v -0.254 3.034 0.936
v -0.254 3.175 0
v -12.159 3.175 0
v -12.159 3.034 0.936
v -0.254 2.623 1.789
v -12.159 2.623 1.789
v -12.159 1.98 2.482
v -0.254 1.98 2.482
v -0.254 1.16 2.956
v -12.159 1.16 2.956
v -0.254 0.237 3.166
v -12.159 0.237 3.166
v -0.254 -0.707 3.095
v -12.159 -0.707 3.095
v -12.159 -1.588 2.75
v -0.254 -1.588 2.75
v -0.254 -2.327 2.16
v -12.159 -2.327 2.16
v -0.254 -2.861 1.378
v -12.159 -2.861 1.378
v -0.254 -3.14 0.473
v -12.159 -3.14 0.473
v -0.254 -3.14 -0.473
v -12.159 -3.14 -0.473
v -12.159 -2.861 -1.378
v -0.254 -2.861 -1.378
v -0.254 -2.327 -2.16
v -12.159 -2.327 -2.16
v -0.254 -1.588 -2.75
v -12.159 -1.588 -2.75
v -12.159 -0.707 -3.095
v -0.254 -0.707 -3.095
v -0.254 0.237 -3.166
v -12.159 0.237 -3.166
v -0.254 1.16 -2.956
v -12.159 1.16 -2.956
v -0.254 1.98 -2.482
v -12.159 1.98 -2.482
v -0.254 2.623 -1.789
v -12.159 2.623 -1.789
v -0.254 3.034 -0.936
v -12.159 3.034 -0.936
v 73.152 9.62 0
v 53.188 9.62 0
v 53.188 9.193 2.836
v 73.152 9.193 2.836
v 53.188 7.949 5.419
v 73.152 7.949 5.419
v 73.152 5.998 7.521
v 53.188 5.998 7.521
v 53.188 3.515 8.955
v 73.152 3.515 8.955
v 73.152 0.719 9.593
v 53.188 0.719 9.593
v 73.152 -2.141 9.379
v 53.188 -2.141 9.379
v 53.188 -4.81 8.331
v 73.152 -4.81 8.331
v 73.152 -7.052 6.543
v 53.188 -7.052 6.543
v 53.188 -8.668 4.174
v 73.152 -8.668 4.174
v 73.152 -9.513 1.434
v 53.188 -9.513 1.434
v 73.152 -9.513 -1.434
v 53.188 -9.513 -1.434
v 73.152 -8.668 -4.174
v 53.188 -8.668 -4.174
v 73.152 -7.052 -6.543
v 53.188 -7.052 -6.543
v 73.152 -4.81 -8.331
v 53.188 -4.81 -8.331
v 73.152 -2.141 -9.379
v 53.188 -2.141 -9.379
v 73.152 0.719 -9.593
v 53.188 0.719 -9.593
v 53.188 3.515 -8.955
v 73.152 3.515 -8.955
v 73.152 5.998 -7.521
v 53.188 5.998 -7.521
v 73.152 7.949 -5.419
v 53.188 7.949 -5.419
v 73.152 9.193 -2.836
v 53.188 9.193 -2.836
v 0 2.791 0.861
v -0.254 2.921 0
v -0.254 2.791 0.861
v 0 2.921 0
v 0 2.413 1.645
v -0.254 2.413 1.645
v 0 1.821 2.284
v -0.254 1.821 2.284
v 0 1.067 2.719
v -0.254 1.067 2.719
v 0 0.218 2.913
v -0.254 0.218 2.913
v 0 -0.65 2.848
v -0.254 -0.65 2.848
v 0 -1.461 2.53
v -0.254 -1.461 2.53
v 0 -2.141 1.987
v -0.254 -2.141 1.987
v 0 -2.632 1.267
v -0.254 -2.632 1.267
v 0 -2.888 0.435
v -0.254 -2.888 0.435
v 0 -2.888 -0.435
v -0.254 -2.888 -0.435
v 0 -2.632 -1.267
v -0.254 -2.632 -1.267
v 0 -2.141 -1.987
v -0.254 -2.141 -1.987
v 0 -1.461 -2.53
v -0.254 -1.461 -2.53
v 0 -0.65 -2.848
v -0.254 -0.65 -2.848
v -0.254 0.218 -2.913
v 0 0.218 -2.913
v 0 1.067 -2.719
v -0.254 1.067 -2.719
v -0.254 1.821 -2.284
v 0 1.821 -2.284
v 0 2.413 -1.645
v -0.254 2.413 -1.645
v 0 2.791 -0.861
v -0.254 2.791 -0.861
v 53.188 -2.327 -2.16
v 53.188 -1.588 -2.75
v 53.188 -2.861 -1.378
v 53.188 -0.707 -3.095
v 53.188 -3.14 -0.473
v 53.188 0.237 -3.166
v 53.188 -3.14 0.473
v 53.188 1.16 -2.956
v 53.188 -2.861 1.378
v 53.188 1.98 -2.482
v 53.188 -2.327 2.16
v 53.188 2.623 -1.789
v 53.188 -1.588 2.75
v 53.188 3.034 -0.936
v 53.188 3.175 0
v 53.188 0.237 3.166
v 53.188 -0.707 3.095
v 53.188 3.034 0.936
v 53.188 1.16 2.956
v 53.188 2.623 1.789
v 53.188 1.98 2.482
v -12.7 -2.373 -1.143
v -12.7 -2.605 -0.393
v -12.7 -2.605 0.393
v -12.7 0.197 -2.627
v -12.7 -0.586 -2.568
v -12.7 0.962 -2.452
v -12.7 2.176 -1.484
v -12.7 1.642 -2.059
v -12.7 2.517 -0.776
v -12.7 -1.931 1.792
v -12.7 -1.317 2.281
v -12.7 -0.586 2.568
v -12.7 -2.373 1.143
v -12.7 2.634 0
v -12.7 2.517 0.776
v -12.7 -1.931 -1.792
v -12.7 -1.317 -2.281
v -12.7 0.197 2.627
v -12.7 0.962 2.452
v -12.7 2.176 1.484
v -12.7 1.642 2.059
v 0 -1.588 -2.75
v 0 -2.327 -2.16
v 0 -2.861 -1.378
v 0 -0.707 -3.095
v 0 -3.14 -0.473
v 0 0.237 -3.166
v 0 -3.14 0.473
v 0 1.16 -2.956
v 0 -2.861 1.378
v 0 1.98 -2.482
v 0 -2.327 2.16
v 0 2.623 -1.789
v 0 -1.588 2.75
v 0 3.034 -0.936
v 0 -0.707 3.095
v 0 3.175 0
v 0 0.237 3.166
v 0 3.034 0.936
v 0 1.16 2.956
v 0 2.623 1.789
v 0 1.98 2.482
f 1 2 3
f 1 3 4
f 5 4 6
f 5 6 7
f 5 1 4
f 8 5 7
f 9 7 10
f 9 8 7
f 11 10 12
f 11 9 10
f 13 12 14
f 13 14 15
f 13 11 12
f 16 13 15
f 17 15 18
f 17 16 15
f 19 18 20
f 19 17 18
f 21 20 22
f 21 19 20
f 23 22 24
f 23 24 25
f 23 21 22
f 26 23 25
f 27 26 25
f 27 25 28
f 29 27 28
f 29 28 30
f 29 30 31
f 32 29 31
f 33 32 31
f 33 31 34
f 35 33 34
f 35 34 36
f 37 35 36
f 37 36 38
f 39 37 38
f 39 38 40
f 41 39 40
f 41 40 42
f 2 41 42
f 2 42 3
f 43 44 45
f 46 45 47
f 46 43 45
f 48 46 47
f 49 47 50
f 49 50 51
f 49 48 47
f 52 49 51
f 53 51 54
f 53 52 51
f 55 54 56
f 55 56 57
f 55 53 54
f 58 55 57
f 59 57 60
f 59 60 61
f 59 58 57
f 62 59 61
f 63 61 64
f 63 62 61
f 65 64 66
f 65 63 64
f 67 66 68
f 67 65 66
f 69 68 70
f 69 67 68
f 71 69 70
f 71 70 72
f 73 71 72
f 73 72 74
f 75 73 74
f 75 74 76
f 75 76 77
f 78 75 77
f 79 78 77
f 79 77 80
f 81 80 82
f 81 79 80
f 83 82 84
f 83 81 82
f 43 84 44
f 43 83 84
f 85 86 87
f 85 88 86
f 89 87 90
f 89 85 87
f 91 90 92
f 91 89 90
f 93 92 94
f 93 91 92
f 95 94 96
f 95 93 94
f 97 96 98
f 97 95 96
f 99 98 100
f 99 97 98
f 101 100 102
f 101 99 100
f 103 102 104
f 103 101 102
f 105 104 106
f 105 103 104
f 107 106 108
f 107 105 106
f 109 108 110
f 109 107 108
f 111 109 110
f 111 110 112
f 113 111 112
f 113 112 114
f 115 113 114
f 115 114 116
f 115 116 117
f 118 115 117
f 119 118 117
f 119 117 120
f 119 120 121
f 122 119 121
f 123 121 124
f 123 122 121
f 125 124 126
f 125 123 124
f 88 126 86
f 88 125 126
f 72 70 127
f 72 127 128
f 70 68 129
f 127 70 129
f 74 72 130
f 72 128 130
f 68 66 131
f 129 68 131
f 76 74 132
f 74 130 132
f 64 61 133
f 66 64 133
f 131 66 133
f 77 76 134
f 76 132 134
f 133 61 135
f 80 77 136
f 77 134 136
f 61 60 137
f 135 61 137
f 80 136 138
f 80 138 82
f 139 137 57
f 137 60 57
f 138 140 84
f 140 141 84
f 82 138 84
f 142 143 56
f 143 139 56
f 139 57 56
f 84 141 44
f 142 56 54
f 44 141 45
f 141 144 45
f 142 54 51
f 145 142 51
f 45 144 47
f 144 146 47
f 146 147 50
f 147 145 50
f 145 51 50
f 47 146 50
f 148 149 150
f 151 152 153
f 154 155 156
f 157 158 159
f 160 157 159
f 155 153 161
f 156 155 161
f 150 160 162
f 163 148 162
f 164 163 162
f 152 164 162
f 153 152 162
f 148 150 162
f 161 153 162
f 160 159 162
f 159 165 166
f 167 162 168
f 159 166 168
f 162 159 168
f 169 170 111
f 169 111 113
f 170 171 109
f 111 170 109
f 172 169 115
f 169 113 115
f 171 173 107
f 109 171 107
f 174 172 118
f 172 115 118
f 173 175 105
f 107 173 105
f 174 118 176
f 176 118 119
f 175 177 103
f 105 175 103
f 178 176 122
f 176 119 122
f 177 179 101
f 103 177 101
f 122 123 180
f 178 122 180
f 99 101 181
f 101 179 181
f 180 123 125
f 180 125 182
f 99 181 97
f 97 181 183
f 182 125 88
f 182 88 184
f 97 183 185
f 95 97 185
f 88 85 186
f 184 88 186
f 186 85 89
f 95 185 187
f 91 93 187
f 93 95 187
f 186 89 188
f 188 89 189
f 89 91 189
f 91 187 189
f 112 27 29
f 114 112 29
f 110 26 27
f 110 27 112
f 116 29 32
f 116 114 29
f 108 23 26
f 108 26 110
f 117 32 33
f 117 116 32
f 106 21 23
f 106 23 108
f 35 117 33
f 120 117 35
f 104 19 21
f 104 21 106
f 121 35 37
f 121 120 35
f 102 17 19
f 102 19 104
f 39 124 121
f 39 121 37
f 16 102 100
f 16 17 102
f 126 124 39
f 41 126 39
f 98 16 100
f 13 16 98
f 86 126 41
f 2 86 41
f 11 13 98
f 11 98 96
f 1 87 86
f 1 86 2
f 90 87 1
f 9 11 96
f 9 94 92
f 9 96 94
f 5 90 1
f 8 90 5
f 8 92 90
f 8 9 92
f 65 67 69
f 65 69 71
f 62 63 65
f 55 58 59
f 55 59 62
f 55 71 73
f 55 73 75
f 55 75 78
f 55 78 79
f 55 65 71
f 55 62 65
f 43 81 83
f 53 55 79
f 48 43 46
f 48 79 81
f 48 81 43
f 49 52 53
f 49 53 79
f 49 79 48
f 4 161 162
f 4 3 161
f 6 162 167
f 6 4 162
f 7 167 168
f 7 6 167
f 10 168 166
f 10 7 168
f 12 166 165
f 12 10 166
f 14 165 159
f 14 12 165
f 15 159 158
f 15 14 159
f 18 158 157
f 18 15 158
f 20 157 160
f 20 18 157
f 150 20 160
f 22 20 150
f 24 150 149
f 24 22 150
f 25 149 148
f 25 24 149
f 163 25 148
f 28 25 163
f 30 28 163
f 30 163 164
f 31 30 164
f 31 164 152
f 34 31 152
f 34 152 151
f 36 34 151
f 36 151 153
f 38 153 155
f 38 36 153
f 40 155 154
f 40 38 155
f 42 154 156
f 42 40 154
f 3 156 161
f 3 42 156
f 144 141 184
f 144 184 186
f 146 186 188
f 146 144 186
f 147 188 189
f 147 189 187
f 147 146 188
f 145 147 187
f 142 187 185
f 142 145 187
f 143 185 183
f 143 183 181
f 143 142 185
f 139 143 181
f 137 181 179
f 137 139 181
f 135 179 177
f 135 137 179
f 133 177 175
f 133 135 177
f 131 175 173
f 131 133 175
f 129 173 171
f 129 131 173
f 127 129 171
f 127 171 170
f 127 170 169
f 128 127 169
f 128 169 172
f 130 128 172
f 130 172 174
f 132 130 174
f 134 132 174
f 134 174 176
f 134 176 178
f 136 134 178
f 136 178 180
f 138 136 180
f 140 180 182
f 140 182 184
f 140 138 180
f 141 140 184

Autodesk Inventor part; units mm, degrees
sketch "Sketch_1" plane through (0, 0, 0) normal (0, 0, 1) x (1, 0, 0)
  line L0 (73.152, 0) -> (0, 0)
  line L1 (0, 0) -> (0, 3.175)
  line L2 (0, 3.175) -> (53.1876, 3.175)
  line L3 (53.1876, 3.175) -> (53.1876, 9.6203)
  line L4 (53.1876, 9.6203) -> (73.152, 9.6203)
  line L5 (73.152, 9.6203) -> (73.152, 0)
  line L6 (73.152, 0) -> (0, 0)
revolve "Revolution1" add sketch "Sketch_1" angle 360 about axis through (73.152, 0, 0) along (1, 0, 0)
sketch "Sketch_3" plane through (0, 0, 0) normal (0, 0, 1) x (1, 0, 0)
  line L0 (0, 0) -> (-12.7, 0)
  line L1 (-12.7, 0) -> (-12.7, 2.634)
  line L2 (-12.7, 2.634) -> (-12.159, 3.175)
  line L3 (-12.159, 3.175) -> (0, 3.175)
  line L4 (0, 3.175) -> (0, 0)
  line L5 (0, 0) -> (-12.7, 0)
revolve "Revolution2" add sketch "Sketch_3" angle 360 about axis through (0, 0, 0) along (1, 0, 0)
thread "Thread1" size "1/4-28 UNF" class "2A" standard "ANSI Unified Screw Threads" length 12.159
sketch "Sketch_30" plane through (0, 0, 0) normal (0, 0, 1) x (1, 0, 0)
  line L0 (0, 0) -> (-0.254, 0)
  line L1 (-0.254, 2.921) -> (0, 2.921)
  line L2 (0, 2.921) -> (0, 3.429)
  line L3 (0, 3.429) -> (-0.254, 3.429)
  line L4 (-0.254, 3.429) -> (-0.254, 2.921)
revolve "Revolution3" cut sketch "Sketch_30" angle 360 about axis through (0, 0, 0) along (1, 0, 0)
ref_plane "dia1_XY" through (0, 3.175, 0) normal (1, 0, 0) x (0, 0, -1)
ref_plane "dia1_YZ" through (0, 3.175, 0) normal (0, 0, -1) x (0, 1, 0)
ref_plane "dia1_ZX" through (0, 3.175, 0) normal (0, 1, 0) x (1, 0, 0)
ref_plane "dia12_XY" through (0, 0, 10.9537) normal (1, 0, 0) x (0, 0, -1)
ref_plane "dia12_YZ" through (0, 0, 10.9537) normal (0, 0, -1) x (0, 1, 0)
ref_plane "dia12_ZX" through (0, 0, 10.9537) normal (0, 1, 0) x (1, 0, 0)
ref_plane "dia1r_XY" through (0, 0, 10.2235) normal (1, 0, 0) x (0, 0, -1)
ref_plane "dia1r_YZ" through (0, 0, 10.2235) normal (0, 0, -1) x (0, 1, 0)
ref_plane "dia1r_ZX" through (0, 0, 10.2235) normal (0, 1, 0) x (1, 0, 0)
ref_plane "dia2_XY" through (0, -3.175, 0) normal (1, 0, 0) x (0, 0, -1)
ref_plane "dia2_YZ" through (0, -3.175, 0) normal (0, 0, -1) x (0, 1, 0)
ref_plane "dia2_ZX" through (0, -3.175, 0) normal (0, 1, 0) x (1, 0, 0)
ref_plane "dia22_XY" through (0, 0, -10.9537) normal (1, 0, 0) x (0, 0, -1)
ref_plane "dia22_YZ" through (0, 0, -10.9537) normal (0, 0, -1) x (0, 1, 0)
ref_plane "dia22_ZX" through (0, 0, -10.9537) normal (0, 1, 0) x (1, 0, 0)
ref_plane "dia2r_XY" through (0, 0, -10.2235) normal (1, 0, 0) x (0, 0, -1)
ref_plane "dia2r_YZ" through (0, 0, -10.2235) normal (0, 0, -1) x (0, 1, 0)
ref_plane "dia2r_ZX" through (0, 0, -10.2235) normal (0, 1, 0) x (1, 0, 0)
ref_plane "rl1_XY" through (-12.7, 0, 0) normal (1, 0, 0) x (0, 0, -1)
ref_plane "rl1_YZ" through (-12.7, 0, 0) normal (0, 0, -1) x (0, 1, 0)
ref_plane "rl1_ZX" through (-12.7, 0, 0) normal (0, 1, 0) x (1, 0, 0)
ref_plane "rl2_XY" through (0, 0, 0) normal (1, 0, 0) x (0, 0, -1)
ref_plane "rl2_YZ" through (0, 0, 0) normal (0, 0, -1) x (0, 1, 0)
ref_plane "rl2_ZX" through (0, 0, 0) normal (0, 1, 0) x (1, 0, 0)
ref_plane "rod_cp_XY" through (0, 0, 0) normal (1, 0, 0) x (0, 0, -1)
ref_plane "rod_cp_YZ" through (0, 0, 0) normal (0, 0, -1) x (0, 1, 0)
ref_plane "rod_cp_ZX" through (0, 0, 0) normal (0, 1, 0) x (1, 0, 0)
ref_plane "stroke1_XY" through (0, 0, 0) normal (1, 0, 0) x (0, 0, -1)
ref_plane "stroke1_YZ" through (0, 0, 0) normal (0, 0, -1) x (0, 1, 0)
ref_plane "stroke1_ZX" through (0, 0, 0) normal (0, 1, 0) x (1, 0, 0)
ref_plane "thd1_XY" through (-12.7, 3.175, 0) normal (1, 0, 0) x (0, 0, -1)
ref_plane "thd1_YZ" through (-12.7, 3.175, 0) normal (0, 0, -1) x (0, 1, 0)
ref_plane "thd1_ZX" through (-12.7, 3.175, 0) normal (0, 1, 0) x (1, 0, 0)
ref_plane "thd2_XY" through (-12.7, -3.175, 0) normal (1, 0, 0) x (0, 0, -1)
ref_plane "thd2_YZ" through (-12.7, -3.175, 0) normal (0, 0, -1) x (0, 1, 0)
ref_plane "thd2_ZX" through (-12.7, -3.175, 0) normal (0, 1, 0) x (1, 0, 0)
ref_plane "to_rod_clevis_XY" through (-16.764, 0, 0) normal (1, 0, 0) x (0, 0, -1)
ref_plane "to_rod_clevis_YZ" through (-16.764, 0, 0) normal (0, 0, -1) x (0, 1, 0)
ref_plane "to_rod_clevis_ZX" through (-16.764, 0, 0) normal (0, 1, 0) x (1, 0, 0)
properties part number "C-040.5-RP0000_rod"
